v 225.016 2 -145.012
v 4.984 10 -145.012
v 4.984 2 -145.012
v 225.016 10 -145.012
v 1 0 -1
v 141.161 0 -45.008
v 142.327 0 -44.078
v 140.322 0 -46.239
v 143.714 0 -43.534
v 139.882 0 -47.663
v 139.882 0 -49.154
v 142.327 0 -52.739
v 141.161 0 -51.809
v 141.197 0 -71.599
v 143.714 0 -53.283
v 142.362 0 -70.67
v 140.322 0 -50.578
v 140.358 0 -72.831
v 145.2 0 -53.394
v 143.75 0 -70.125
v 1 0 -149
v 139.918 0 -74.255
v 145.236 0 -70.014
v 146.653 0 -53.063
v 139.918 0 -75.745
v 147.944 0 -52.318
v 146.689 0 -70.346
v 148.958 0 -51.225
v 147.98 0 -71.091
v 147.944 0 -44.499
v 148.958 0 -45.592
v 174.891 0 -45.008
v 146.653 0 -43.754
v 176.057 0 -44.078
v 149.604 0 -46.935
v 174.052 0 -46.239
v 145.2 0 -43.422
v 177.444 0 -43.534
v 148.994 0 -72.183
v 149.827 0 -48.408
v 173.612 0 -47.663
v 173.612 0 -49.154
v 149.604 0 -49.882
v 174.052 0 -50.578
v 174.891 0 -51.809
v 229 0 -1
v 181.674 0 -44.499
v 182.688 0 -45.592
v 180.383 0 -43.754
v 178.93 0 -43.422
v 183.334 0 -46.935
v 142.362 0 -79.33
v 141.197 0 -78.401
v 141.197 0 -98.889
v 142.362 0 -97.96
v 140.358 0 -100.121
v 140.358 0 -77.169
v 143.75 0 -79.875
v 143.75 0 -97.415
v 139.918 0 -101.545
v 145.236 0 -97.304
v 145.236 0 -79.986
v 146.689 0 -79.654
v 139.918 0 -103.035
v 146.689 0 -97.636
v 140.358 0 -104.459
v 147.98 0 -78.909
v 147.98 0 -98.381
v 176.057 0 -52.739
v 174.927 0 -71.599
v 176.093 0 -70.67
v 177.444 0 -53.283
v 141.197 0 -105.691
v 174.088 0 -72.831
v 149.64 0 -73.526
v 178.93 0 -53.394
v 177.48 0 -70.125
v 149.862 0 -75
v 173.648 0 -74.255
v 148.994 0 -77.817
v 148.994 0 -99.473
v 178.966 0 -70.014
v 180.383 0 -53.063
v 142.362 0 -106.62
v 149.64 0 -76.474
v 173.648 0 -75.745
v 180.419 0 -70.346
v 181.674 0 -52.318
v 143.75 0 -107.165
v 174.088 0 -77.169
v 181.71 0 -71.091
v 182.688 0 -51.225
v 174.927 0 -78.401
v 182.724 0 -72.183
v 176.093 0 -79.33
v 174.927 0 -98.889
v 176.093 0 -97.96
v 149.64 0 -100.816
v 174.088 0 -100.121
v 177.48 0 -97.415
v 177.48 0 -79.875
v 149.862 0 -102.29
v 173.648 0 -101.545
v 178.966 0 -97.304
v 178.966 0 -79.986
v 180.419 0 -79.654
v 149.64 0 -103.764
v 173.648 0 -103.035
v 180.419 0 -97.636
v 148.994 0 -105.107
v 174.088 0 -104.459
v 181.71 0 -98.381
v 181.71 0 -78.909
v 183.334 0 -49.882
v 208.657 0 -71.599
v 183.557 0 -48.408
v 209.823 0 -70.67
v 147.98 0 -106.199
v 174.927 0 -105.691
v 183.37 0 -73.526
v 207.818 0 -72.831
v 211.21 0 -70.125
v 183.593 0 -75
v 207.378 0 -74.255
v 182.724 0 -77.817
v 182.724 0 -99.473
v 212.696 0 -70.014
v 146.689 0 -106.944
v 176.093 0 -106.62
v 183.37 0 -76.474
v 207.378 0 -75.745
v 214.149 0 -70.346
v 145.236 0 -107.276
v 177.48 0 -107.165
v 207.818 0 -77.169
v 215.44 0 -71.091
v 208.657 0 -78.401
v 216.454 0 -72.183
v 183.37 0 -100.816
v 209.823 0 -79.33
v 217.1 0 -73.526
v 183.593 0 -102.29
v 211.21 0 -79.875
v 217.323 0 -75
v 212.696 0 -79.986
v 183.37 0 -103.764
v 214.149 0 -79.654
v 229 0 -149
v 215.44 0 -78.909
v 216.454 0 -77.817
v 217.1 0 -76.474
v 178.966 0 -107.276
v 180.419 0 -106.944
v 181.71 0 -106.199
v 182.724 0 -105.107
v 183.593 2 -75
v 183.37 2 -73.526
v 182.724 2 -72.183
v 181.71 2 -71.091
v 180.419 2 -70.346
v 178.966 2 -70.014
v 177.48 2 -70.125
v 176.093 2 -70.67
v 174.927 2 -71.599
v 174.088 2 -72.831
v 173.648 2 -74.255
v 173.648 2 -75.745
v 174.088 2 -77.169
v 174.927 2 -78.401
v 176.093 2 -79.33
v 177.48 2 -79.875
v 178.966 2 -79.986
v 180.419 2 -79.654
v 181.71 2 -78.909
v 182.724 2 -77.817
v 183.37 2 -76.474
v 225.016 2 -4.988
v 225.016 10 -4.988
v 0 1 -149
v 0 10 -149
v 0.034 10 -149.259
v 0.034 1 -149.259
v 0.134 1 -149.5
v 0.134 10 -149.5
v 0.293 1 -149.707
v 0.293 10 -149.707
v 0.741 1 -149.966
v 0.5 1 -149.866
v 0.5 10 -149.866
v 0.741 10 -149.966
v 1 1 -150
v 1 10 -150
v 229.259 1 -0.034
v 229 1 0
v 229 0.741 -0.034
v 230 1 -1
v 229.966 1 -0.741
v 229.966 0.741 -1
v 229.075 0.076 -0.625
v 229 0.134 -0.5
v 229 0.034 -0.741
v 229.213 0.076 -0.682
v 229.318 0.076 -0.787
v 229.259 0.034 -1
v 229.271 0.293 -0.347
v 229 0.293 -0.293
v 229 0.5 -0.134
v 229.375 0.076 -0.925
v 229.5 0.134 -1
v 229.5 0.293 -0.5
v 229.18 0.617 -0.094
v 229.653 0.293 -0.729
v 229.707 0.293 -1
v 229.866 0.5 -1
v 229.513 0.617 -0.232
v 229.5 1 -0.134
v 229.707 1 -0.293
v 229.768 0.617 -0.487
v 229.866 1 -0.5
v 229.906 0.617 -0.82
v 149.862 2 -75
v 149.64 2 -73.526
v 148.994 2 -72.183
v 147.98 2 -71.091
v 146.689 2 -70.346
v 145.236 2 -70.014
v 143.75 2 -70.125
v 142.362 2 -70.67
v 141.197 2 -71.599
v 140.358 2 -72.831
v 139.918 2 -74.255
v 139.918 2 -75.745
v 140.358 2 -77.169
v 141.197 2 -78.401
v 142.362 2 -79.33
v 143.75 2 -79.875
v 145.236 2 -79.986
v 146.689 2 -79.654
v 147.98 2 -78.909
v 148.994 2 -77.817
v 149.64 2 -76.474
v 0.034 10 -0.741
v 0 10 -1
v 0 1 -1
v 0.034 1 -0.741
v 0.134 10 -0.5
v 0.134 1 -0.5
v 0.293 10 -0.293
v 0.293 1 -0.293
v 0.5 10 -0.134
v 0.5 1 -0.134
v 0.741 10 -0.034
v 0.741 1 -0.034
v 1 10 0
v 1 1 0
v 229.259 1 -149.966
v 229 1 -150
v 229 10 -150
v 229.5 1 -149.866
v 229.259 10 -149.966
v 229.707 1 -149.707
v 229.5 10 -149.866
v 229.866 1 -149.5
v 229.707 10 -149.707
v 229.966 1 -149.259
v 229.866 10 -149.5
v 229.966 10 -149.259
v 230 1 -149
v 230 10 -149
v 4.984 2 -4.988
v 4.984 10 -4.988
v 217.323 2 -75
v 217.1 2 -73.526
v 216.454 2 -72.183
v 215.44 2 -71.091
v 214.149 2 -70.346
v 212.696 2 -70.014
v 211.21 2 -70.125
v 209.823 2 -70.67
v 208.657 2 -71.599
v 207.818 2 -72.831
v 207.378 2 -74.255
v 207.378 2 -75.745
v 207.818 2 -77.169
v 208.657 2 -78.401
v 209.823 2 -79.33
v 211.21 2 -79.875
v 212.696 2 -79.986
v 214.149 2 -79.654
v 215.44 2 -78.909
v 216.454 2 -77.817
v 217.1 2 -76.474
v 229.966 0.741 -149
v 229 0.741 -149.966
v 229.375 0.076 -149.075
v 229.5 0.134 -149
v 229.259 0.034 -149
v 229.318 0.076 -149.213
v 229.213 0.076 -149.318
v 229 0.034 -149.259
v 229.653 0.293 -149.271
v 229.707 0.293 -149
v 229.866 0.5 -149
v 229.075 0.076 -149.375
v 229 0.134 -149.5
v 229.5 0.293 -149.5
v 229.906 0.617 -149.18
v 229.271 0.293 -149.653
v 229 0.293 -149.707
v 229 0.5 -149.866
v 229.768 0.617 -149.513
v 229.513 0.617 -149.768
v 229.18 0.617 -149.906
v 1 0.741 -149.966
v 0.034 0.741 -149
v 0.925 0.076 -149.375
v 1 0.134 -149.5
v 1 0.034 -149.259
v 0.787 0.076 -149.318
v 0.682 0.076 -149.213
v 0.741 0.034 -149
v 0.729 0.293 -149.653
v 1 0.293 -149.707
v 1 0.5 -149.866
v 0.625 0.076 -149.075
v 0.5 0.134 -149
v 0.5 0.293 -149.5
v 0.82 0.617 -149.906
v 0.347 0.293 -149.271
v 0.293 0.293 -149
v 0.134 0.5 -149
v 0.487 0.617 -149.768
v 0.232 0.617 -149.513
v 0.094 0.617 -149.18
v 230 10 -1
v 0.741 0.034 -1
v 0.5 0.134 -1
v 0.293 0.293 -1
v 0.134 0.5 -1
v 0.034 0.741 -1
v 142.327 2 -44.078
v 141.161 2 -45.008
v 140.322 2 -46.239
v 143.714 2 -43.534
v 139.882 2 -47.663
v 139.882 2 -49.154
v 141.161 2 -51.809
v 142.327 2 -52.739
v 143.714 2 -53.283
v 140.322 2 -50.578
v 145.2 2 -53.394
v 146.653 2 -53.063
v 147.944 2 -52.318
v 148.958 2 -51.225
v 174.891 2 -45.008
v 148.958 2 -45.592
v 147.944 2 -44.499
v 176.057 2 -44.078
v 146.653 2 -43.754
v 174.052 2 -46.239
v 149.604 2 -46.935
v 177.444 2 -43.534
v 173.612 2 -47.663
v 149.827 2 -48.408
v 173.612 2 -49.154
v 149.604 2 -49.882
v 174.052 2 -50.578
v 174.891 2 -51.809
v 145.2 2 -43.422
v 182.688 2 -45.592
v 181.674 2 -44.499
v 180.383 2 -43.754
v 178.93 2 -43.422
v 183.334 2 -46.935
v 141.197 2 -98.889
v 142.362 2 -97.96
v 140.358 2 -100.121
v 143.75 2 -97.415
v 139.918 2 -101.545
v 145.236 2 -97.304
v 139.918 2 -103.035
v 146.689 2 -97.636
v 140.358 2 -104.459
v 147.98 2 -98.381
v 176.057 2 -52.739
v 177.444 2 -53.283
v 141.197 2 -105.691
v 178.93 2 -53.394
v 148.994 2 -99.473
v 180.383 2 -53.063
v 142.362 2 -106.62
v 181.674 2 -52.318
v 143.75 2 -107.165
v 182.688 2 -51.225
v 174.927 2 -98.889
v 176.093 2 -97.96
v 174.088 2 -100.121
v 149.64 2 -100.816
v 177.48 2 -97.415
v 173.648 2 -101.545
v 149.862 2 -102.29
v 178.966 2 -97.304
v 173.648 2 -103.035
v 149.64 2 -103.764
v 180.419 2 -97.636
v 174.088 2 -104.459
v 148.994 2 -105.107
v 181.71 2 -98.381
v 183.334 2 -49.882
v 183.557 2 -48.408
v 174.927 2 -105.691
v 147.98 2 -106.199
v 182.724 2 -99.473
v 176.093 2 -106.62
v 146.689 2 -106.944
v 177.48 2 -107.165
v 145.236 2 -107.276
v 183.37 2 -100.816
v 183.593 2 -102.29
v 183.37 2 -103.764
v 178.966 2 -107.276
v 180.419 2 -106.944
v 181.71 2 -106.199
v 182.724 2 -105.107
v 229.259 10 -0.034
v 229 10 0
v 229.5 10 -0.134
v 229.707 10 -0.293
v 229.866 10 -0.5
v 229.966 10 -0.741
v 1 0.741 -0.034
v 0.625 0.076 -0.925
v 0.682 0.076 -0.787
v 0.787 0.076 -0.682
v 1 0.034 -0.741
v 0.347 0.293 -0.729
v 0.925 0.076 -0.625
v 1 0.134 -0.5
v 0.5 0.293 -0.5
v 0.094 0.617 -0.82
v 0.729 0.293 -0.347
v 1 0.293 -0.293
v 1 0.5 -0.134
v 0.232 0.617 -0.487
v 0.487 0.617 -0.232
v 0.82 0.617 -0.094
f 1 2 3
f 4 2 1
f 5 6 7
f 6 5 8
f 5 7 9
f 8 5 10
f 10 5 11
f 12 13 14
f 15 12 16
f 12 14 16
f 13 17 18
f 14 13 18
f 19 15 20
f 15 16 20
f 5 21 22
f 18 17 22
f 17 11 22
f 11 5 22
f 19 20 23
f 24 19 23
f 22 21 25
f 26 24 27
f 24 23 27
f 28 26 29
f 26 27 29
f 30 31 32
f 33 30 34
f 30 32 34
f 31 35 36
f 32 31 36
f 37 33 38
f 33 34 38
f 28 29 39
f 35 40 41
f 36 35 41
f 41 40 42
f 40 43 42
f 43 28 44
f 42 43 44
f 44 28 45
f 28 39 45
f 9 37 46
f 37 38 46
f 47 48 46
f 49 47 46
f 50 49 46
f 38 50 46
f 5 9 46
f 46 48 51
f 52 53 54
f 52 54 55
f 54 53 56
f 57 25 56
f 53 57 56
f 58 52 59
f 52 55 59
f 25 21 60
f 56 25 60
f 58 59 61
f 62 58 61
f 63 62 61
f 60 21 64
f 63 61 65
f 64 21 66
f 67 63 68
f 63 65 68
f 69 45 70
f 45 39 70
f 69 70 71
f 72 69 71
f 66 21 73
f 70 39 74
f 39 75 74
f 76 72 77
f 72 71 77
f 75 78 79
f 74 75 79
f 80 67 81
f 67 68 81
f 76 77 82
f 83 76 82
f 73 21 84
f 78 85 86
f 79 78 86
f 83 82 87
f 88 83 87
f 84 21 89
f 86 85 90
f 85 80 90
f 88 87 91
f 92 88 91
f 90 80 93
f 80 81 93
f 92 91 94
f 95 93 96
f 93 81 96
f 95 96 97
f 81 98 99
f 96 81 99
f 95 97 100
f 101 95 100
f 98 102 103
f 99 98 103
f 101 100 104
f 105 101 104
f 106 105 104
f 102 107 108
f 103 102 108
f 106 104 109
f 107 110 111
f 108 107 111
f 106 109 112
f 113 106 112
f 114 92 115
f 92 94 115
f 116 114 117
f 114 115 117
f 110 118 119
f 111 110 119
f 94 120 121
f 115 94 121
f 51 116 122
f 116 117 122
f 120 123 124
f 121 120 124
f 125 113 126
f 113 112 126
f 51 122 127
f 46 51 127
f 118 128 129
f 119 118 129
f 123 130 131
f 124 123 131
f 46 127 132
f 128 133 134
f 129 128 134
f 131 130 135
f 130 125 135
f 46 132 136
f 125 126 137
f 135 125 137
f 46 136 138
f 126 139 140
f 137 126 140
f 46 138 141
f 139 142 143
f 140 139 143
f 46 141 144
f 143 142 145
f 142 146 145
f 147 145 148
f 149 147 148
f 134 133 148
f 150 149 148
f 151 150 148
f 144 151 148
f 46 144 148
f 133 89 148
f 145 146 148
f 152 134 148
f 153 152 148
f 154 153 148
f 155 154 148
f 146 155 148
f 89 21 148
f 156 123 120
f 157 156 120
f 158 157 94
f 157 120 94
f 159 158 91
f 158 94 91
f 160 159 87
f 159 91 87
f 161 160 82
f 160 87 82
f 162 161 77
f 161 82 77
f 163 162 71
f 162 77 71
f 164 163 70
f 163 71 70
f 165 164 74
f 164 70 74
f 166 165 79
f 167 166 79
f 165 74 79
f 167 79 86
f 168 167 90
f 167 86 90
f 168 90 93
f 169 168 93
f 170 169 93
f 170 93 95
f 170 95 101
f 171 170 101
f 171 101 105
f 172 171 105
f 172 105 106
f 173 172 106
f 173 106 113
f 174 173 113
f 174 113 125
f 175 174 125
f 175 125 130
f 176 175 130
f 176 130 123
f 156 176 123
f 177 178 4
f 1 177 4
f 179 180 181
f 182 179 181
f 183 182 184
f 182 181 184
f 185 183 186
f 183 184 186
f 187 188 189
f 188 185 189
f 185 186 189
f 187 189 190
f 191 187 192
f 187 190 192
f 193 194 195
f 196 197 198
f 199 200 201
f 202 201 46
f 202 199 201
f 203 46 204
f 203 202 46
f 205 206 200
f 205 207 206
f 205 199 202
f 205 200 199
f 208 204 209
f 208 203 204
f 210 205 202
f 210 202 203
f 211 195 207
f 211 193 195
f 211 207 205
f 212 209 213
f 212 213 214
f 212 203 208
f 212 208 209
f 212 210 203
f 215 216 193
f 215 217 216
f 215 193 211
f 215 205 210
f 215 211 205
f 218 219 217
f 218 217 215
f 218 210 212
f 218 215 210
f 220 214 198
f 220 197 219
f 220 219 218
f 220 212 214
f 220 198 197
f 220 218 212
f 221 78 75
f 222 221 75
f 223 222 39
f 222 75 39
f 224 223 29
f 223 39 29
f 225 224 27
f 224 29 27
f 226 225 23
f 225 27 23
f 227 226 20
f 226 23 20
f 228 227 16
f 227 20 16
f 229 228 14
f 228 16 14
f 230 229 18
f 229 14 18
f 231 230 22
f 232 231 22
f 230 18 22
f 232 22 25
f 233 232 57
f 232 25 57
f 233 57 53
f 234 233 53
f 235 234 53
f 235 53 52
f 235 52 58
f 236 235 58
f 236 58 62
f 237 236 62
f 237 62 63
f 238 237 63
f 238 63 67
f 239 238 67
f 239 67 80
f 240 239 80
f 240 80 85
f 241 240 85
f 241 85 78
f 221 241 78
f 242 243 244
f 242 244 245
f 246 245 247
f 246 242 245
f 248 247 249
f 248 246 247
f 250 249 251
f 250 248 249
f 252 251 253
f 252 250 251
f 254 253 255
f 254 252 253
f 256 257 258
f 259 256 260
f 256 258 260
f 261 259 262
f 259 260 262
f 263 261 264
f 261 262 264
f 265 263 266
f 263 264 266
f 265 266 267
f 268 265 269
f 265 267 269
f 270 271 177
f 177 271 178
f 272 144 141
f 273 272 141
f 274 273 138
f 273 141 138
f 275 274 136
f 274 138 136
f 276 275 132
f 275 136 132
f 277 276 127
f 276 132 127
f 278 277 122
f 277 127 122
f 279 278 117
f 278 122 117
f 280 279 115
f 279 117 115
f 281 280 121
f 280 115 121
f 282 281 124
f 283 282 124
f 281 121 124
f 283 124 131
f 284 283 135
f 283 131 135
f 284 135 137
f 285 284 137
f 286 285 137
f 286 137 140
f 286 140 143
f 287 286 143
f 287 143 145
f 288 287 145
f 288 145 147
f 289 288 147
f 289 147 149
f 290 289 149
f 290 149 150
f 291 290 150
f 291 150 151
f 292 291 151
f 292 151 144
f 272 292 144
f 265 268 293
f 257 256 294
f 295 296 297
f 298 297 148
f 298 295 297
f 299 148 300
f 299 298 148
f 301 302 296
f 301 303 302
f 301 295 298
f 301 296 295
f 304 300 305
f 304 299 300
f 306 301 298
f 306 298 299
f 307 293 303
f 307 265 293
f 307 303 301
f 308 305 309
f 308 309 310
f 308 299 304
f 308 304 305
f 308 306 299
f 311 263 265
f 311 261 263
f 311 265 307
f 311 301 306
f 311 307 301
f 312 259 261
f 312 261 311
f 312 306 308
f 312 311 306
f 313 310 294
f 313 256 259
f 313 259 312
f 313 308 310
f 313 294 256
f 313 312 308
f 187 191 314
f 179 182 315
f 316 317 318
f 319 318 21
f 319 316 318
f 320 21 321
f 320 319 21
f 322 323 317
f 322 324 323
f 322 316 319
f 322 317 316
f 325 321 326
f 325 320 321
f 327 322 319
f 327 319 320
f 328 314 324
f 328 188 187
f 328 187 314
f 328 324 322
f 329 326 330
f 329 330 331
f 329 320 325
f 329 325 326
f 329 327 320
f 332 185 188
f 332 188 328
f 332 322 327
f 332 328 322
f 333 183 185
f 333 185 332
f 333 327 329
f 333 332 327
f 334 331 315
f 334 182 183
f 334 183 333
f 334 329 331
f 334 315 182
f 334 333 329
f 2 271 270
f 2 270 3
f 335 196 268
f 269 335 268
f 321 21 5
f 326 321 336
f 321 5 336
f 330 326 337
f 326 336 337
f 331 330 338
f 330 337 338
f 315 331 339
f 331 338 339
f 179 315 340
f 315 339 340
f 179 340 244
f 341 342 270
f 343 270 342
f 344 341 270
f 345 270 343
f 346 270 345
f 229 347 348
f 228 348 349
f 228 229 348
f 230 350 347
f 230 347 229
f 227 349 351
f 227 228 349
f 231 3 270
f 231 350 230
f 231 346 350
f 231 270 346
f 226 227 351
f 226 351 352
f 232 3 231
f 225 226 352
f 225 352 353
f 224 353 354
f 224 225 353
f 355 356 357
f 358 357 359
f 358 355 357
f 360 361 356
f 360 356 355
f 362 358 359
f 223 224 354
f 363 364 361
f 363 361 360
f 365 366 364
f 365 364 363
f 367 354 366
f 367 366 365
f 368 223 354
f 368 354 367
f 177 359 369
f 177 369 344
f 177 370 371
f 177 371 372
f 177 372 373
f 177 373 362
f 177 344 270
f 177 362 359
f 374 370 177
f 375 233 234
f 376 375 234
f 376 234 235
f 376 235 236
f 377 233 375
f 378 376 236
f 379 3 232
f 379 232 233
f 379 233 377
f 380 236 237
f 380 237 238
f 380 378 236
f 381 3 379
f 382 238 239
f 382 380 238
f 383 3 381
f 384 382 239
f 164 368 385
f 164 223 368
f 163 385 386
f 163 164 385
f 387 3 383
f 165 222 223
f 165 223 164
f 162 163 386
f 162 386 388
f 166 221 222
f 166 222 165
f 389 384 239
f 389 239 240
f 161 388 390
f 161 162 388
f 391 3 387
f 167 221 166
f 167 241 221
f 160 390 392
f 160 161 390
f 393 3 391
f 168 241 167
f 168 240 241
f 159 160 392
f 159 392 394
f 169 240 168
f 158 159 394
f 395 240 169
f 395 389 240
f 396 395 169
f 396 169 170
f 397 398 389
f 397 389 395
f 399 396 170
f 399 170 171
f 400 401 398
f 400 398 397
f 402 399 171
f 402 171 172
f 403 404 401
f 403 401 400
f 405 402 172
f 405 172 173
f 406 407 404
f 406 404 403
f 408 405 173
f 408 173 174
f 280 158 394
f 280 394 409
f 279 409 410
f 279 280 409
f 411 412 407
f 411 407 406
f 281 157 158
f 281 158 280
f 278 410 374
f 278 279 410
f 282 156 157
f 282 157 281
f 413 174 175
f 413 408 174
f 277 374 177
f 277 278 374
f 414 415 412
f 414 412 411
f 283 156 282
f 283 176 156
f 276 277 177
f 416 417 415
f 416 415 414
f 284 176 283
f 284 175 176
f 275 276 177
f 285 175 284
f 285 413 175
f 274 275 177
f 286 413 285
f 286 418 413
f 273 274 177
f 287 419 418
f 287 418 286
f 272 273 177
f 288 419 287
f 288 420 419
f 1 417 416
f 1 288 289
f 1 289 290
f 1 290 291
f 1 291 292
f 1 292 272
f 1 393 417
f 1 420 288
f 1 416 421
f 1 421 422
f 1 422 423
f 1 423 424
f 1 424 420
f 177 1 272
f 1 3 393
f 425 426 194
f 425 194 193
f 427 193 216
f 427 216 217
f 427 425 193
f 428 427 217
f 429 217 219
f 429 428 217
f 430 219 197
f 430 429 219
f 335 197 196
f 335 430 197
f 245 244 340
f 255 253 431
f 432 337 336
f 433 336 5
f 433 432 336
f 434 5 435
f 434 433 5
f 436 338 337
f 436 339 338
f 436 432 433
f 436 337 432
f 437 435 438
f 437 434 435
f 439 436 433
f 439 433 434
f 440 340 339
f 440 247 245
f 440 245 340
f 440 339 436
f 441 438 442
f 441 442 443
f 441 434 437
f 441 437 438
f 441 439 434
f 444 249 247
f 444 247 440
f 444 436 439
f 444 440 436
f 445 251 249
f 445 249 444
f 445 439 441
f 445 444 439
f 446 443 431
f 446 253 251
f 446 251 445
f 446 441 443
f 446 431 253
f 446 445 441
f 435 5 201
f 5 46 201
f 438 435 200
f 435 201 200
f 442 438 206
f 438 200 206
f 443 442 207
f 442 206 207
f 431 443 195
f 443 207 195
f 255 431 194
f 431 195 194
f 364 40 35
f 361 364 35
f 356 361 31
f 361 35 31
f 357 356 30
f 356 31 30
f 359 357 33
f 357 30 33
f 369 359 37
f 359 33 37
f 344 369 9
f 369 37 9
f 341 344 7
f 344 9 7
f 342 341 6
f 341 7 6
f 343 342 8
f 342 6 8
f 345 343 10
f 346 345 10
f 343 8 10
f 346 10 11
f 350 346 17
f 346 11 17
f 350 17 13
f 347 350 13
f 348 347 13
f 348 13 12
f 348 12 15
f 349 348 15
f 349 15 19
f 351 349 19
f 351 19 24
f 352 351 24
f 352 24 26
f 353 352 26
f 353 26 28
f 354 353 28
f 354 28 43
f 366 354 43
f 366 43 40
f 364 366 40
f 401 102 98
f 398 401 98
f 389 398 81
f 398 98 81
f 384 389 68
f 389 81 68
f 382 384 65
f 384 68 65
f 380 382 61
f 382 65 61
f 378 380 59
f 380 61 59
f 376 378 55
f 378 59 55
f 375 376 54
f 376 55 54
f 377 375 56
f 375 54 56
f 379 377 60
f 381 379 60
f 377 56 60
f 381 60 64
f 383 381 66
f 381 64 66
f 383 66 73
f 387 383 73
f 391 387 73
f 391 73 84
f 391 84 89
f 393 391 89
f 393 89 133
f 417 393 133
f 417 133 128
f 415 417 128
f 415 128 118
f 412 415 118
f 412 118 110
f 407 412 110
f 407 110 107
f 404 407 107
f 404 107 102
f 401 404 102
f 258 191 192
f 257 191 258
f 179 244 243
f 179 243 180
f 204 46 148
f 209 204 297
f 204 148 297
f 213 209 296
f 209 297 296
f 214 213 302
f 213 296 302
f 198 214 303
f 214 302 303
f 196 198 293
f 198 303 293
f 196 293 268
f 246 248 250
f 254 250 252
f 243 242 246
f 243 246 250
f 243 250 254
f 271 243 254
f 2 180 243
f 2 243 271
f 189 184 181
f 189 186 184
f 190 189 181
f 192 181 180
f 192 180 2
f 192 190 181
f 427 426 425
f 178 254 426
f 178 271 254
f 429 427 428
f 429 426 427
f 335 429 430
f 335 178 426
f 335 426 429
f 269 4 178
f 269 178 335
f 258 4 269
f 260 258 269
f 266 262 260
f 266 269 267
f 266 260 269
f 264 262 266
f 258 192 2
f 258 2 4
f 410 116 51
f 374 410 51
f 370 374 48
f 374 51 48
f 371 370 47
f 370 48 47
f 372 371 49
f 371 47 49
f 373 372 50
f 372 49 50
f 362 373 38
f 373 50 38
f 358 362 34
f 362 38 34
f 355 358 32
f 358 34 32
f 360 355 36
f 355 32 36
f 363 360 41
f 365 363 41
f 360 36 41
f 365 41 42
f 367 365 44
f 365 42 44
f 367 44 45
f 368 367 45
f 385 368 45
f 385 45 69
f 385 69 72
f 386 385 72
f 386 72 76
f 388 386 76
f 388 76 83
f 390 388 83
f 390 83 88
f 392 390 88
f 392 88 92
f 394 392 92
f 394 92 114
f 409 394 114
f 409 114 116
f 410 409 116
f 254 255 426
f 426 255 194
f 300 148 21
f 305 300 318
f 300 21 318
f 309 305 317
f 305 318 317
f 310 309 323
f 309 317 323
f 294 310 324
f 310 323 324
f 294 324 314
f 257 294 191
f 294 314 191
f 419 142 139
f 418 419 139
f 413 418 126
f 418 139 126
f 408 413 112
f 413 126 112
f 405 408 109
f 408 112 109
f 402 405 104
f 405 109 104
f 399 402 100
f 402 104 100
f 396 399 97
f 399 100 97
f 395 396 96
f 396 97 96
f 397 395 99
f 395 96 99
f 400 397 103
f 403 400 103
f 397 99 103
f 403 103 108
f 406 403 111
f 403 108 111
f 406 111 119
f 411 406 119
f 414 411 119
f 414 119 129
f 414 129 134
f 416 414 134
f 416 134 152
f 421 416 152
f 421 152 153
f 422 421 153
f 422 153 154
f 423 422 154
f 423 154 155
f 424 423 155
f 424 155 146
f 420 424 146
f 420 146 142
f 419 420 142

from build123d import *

# Parameters (mm, degrees)
SKETCH1_W           = 230
SKETCH1_H           = 150
BOSS_EXTRUDE3_DEPTH = 10
SKETCH3_W           = 220.032470936
SKETCH3_H           = 140.023771478
CUT_EXTRUDE1_DEPTH  = 8
FILLET1_R           = 1
FILLET2_R           = 1
FILLET3_R           = 1
SKETCH6_R           = 5
CUT_EXTRUDE3_DEPTH  = 10


with BuildPart() as part:
    # Sketch1 → Boss-Extrude3 (new body)
    with BuildSketch(Plane(origin=(0, 0, 0), x_dir=(1, 0, 0), z_dir=(0, 1, 0))):
        with Locations((115, 75)):
            Rectangle(SKETCH1_W, SKETCH1_H)
    extrude(amount=BOSS_EXTRUDE3_DEPTH)

    # Sketch3 → Cut-Extrude1 (cut)
    with BuildSketch(Plane(origin=(0, 10, 0), x_dir=(1, 0, 0), z_dir=(0, 1, 0))):
        with Locations((115, 75)):
            Rectangle(SKETCH3_W, SKETCH3_H)
    extrude(amount=-CUT_EXTRUDE1_DEPTH, mode=Mode.SUBTRACT)

    # Fillet1
    fillet1_edges = [part.edges().sort_by_distance(p)[0] for p in [
        (0, 5, 0),
    ]]
    fillet(fillet1_edges, radius=FILLET1_R)

    # Fillet2
    fillet2_edges = [part.edges().sort_by_distance(p)[0] for p in [
        (0, 5, -150),
        (230, 5, -150),
        (230, 5, 0),
    ]]
    fillet(fillet2_edges, radius=FILLET2_R)

    # Fillet3
    fillet3_edges = [part.edges().sort_by_distance(p)[0] for p in [
        (115, 0, 0),
        (0.292893219, 0, -0.292893219),
        (0, 0, -75),
        (115, 0, -150),
        (230, 0, -75),
        (229.707106781, 0, -149.707106781),
        (229.707106781, 0, -0.292893219),
        (0.292893219, 0, -149.707106781),
    ]]
    fillet(fillet3_edges, radius=FILLET3_R)

    # Sketch6 → Cut-Extrude3 (cut)
    with BuildSketch(Plane.XZ):
        with Locations((144.826508181, -48.408466726)):
            Circle(SKETCH6_R)
        with Locations((178.556568371, -48.408466726)):
            Circle(SKETCH6_R)
        with Locations((178.592552161, -75)):
            Circle(SKETCH6_R)
        with Locations((144.862491971, -75)):
            Circle(SKETCH6_R)
        with Locations((144.862491971, -102.290057641)):
            Circle(SKETCH6_R)
        with Locations((178.592552161, -102.290057641)):
            Circle(SKETCH6_R)
        with Locations((212.322612351, -75)):
            Circle(SKETCH6_R)
    extrude(amount=-CUT_EXTRUDE3_DEPTH, mode=Mode.SUBTRACT)


solid = part.part
